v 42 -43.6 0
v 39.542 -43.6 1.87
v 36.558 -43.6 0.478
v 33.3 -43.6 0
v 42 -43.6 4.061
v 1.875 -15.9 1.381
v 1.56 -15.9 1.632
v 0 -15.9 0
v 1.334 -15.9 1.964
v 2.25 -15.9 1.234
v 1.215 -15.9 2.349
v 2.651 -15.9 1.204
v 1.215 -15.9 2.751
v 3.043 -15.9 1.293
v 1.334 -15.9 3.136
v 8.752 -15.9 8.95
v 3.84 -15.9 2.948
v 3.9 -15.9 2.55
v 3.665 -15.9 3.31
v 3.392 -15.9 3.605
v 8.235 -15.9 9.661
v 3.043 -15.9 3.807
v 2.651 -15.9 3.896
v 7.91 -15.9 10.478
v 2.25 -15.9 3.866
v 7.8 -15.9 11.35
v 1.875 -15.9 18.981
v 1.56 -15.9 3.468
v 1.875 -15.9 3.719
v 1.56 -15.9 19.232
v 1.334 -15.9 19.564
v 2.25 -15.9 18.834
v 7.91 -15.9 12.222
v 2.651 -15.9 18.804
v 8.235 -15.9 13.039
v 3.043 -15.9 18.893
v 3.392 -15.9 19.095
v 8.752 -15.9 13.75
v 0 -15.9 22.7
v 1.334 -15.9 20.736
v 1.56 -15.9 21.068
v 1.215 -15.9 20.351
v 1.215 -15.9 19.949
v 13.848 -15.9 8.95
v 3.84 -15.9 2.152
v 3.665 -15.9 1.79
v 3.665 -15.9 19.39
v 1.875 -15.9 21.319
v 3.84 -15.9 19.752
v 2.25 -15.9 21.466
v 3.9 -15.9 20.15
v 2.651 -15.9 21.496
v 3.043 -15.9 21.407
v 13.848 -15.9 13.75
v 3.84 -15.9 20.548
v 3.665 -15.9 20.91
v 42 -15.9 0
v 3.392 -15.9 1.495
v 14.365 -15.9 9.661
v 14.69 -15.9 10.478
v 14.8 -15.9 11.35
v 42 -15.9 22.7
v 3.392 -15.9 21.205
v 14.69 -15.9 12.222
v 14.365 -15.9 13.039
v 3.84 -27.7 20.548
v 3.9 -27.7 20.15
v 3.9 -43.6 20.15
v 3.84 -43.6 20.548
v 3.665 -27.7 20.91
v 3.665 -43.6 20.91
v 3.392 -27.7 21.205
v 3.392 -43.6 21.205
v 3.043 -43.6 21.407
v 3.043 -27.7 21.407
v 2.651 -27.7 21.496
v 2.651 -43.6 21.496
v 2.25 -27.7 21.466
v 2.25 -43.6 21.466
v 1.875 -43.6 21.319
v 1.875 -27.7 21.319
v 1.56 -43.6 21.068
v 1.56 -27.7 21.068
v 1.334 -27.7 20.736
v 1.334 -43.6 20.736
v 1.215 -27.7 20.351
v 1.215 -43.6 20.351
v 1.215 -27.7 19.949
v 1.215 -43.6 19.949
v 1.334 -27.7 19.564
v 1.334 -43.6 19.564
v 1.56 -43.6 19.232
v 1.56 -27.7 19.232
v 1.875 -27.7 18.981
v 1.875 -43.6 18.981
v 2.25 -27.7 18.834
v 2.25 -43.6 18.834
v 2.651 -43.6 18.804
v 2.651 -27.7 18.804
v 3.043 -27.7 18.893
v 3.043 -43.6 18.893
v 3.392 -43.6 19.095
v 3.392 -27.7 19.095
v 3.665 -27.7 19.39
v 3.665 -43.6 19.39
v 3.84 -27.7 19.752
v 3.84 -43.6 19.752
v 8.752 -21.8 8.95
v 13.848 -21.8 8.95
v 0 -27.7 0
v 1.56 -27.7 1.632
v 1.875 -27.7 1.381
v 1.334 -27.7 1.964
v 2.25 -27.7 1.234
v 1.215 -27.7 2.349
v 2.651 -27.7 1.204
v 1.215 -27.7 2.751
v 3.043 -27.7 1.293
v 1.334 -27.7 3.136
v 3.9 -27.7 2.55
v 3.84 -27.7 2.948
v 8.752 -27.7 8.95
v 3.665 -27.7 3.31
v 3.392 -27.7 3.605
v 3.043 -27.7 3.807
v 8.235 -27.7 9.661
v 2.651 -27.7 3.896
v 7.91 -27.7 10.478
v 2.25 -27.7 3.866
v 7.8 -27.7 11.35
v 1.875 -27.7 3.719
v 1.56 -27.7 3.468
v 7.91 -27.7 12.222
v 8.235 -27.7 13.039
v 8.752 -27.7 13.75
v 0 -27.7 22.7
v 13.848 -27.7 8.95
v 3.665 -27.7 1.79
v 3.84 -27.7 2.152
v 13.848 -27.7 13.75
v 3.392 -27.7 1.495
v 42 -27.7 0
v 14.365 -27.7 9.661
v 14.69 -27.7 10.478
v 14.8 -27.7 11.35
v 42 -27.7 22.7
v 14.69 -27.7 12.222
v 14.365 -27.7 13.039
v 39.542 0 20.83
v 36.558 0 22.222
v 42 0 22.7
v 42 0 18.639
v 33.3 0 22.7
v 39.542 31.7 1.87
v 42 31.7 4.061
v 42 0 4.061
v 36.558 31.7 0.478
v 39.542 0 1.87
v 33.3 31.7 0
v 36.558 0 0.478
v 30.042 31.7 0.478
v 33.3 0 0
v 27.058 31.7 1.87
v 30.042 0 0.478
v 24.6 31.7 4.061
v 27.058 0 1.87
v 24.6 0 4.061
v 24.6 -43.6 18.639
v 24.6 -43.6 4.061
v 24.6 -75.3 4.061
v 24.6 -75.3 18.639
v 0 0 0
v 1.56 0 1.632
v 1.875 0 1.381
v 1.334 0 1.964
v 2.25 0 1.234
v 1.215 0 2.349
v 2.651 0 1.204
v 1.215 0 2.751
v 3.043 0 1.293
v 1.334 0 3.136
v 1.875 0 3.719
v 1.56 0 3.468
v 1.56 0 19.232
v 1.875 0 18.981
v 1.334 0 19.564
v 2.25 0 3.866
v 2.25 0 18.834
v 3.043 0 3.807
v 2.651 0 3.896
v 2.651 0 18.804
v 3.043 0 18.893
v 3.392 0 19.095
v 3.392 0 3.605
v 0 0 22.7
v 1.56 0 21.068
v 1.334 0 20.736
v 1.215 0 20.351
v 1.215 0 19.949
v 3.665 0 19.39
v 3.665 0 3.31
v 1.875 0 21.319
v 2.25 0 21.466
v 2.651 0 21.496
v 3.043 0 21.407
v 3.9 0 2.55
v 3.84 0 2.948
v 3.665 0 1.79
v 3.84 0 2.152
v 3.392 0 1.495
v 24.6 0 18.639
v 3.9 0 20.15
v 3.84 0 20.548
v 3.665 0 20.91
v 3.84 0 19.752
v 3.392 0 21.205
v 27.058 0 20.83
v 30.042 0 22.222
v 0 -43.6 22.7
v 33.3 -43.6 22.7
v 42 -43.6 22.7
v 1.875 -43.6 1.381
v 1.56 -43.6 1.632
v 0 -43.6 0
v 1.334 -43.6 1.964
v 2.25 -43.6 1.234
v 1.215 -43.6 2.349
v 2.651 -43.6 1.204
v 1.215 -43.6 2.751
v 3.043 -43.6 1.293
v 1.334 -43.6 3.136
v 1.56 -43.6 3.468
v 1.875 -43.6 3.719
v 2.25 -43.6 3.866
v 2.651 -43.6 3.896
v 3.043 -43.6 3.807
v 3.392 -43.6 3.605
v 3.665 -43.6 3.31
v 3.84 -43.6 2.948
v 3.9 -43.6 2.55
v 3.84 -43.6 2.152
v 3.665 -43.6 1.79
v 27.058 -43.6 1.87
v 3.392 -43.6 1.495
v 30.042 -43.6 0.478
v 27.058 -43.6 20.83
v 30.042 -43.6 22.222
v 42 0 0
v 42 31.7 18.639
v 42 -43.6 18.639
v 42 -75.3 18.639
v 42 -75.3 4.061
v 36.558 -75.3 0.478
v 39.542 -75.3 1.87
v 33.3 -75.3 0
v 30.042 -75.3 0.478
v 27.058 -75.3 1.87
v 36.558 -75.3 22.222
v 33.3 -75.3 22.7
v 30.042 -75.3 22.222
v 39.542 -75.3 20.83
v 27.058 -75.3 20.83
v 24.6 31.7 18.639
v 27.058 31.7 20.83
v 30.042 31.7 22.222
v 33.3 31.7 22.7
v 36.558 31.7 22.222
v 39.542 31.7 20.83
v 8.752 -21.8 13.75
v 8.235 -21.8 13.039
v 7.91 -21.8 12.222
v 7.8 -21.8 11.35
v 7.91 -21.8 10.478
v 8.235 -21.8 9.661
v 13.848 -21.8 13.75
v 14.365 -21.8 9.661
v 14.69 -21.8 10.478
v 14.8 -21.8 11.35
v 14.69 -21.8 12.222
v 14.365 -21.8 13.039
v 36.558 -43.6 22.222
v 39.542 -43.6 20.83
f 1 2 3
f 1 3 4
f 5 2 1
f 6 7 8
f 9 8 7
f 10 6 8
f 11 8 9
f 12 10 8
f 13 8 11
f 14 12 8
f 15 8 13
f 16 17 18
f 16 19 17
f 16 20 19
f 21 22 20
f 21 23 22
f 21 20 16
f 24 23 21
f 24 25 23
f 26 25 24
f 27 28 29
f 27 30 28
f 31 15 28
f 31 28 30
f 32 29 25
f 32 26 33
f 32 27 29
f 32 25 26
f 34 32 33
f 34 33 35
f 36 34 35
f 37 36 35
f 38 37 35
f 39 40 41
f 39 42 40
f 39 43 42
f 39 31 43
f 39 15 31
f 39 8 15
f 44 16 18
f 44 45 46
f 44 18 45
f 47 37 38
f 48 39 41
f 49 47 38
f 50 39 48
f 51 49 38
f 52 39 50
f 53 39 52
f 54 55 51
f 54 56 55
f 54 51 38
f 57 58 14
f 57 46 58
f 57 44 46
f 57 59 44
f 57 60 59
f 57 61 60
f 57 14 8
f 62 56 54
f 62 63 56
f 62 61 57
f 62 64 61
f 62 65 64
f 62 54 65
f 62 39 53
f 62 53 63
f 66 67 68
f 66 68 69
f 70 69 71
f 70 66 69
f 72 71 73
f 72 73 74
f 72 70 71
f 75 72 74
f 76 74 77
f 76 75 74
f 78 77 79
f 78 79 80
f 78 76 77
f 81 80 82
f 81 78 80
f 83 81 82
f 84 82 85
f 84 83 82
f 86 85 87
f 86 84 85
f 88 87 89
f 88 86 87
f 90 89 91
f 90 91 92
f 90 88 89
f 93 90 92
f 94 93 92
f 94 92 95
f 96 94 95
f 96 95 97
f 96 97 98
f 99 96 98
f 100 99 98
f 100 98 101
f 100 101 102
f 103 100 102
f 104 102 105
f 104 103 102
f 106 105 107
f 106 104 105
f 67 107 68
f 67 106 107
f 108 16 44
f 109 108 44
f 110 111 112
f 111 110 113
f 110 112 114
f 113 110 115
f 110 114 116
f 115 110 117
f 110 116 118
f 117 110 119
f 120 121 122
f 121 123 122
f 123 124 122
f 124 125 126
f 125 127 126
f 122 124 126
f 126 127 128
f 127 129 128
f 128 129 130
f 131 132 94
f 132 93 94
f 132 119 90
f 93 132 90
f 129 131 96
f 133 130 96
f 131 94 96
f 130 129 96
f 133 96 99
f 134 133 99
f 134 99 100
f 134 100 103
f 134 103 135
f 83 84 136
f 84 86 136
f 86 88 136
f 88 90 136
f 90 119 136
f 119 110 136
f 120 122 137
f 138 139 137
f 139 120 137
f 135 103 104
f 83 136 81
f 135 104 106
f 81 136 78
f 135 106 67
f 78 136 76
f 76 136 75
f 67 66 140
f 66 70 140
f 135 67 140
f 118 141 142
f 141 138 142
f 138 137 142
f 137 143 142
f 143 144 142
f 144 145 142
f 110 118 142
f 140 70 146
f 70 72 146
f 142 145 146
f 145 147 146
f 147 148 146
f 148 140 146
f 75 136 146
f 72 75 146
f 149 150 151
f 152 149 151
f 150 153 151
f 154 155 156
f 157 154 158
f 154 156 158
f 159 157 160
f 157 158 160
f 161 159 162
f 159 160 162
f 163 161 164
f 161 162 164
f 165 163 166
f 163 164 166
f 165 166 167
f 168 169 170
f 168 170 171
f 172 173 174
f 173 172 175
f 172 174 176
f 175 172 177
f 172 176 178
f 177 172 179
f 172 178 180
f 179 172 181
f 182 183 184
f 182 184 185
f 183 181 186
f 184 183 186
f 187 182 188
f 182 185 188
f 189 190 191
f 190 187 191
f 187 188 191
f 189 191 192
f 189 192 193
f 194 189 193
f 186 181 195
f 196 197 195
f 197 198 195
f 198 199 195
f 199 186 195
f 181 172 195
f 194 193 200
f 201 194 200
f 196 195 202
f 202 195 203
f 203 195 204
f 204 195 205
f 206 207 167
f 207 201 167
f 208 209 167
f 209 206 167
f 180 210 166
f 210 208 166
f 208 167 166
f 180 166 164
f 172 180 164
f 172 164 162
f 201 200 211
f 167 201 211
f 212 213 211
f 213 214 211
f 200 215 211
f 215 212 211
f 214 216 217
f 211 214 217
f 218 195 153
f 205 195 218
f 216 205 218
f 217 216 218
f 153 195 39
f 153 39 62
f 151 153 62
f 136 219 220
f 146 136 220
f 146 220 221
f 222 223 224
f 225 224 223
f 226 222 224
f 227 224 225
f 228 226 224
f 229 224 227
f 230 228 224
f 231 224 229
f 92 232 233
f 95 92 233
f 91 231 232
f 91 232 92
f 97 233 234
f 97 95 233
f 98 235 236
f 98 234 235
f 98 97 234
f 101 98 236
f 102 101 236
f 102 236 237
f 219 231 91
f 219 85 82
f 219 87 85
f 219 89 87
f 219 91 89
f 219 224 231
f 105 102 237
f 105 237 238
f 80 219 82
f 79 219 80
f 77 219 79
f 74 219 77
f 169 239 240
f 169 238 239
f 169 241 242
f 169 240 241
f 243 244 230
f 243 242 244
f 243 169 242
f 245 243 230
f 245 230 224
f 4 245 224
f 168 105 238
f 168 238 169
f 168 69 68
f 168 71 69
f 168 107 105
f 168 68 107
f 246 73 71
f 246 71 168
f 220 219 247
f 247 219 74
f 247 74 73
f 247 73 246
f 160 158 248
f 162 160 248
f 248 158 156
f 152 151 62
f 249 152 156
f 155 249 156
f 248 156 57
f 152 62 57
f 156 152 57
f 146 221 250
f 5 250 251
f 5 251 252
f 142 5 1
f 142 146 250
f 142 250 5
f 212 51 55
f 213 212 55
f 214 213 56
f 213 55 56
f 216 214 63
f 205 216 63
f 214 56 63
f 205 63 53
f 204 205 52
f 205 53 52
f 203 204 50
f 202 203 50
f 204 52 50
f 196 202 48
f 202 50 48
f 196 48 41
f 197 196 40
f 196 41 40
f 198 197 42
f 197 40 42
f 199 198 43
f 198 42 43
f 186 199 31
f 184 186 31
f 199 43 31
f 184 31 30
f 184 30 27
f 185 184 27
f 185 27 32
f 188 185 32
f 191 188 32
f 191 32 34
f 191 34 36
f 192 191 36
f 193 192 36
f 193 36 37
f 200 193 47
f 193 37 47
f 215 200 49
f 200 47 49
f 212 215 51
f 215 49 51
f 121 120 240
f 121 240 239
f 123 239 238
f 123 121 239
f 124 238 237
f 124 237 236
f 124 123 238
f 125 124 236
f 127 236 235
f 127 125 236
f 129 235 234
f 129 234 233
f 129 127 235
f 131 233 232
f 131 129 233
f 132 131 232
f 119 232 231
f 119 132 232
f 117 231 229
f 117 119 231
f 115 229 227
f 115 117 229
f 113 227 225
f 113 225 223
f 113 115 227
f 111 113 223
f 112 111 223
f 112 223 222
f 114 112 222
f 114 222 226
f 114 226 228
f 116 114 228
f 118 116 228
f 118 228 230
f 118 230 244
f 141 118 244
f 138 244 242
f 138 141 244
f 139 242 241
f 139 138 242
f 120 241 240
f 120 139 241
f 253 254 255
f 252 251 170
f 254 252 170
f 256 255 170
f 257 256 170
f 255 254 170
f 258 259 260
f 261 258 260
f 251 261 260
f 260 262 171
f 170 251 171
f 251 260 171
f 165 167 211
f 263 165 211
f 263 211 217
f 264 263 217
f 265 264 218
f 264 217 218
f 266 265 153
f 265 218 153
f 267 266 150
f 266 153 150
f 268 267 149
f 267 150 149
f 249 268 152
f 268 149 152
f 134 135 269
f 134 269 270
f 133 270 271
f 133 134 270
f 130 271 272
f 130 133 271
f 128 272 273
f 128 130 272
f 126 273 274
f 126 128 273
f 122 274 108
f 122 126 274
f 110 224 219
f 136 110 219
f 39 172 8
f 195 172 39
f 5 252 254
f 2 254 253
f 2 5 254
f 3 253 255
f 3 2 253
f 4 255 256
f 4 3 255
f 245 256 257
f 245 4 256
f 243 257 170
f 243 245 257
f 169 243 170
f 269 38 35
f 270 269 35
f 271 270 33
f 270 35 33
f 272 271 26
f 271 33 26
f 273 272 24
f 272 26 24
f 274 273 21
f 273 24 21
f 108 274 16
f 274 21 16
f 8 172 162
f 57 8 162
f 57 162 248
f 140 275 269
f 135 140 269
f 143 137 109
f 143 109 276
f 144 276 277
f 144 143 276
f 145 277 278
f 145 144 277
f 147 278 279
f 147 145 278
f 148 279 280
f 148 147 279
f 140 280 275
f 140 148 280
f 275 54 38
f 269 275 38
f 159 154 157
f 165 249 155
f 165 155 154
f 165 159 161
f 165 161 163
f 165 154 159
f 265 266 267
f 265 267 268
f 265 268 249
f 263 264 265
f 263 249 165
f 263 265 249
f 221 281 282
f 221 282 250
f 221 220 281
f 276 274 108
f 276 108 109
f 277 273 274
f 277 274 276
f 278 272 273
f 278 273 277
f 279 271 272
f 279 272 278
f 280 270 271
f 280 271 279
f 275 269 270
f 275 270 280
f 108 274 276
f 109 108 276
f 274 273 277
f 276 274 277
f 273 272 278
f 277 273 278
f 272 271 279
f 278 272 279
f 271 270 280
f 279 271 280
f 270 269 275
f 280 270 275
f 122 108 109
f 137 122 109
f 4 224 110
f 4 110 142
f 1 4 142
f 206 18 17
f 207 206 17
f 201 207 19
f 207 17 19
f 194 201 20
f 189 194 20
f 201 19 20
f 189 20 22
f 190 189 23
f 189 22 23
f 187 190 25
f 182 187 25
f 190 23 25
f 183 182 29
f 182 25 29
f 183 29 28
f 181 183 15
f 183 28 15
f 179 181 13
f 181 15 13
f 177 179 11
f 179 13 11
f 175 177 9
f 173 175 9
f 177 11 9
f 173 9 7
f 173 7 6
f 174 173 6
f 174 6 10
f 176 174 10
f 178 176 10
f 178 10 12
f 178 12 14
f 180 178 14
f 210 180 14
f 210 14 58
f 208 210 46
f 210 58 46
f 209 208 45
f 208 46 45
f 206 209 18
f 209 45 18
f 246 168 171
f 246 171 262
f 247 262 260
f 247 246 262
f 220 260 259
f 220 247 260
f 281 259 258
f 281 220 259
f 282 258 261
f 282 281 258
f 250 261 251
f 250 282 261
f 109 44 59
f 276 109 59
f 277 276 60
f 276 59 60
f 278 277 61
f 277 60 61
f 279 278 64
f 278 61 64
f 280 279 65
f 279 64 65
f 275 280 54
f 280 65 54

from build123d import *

# Parameters (mm, degrees)
F0_W     = 42
F0_H     = 22.7
F1_DEPTH = 15.9
F2_R     = 1.35
F3_DEPTH = 15.9
F5_DEPTH = 5.9
F7_DEPTH = 31.7


with BuildPart() as f1:
    # F0 (on Front) → F1 (new body)
    with BuildSketch(Plane.XZ):
        with Locations((21, 11.35)):
            Rectangle(F0_W, F0_H)
    extrude(amount=F1_DEPTH)

    # F2 (on face) → F3 (cut, through all)
    with BuildSketch(Plane.XZ.offset(15.9)):
        with Locations((2.55, 20.15)):
            Circle(F2_R)
        with Locations((2.55, 2.55)):
            Circle(F2_R)
    extrude(amount=-F3_DEPTH, mode=Mode.SUBTRACT)

    # F4 (on face) → F5 (join)
    with BuildSketch(Plane.XZ.offset(15.9)):
        with BuildLine():
            Line((13.847548, 13.75), (8.752452, 13.75))
            ThreePointArc((8.752452, 13.75), (7.8, 11.35), (8.752452, 8.95))
            Line((8.752452, 8.95), (13.847548, 8.95))
            ThreePointArc((13.847548, 8.95), (14.8, 11.35), (13.847548, 13.75))
        make_face()
    extrude(amount=F5_DEPTH)

    # F6 (on face) → F7 (join)
    with BuildSketch(Plane(origin=(0, 0, 0), x_dir=(-1, 0, 0), z_dir=(0, 1, 0))):
        with BuildLine():
            Line((-42, 18.639204), (-42, 4.060796))
            ThreePointArc((-42, 4.060796), (-33.3, 0), (-24.6, 4.060796))
            Line((-24.6, 4.060796), (-24.6, 18.639204))
            ThreePointArc((-24.6, 18.639204), (-33.3, 22.7), (-42, 18.639204))
        make_face()
    extrude(amount=F7_DEPTH)


with BuildPart() as f8_1:
    # F8: instance of F1
    add(f1.part.mirror(Plane(origin=(11.3, -21.8, 11.35), x_dir=(1, 0, 0), z_dir=(0, -1, 0))))


solid = Compound([f1.part, f8_1.part])
